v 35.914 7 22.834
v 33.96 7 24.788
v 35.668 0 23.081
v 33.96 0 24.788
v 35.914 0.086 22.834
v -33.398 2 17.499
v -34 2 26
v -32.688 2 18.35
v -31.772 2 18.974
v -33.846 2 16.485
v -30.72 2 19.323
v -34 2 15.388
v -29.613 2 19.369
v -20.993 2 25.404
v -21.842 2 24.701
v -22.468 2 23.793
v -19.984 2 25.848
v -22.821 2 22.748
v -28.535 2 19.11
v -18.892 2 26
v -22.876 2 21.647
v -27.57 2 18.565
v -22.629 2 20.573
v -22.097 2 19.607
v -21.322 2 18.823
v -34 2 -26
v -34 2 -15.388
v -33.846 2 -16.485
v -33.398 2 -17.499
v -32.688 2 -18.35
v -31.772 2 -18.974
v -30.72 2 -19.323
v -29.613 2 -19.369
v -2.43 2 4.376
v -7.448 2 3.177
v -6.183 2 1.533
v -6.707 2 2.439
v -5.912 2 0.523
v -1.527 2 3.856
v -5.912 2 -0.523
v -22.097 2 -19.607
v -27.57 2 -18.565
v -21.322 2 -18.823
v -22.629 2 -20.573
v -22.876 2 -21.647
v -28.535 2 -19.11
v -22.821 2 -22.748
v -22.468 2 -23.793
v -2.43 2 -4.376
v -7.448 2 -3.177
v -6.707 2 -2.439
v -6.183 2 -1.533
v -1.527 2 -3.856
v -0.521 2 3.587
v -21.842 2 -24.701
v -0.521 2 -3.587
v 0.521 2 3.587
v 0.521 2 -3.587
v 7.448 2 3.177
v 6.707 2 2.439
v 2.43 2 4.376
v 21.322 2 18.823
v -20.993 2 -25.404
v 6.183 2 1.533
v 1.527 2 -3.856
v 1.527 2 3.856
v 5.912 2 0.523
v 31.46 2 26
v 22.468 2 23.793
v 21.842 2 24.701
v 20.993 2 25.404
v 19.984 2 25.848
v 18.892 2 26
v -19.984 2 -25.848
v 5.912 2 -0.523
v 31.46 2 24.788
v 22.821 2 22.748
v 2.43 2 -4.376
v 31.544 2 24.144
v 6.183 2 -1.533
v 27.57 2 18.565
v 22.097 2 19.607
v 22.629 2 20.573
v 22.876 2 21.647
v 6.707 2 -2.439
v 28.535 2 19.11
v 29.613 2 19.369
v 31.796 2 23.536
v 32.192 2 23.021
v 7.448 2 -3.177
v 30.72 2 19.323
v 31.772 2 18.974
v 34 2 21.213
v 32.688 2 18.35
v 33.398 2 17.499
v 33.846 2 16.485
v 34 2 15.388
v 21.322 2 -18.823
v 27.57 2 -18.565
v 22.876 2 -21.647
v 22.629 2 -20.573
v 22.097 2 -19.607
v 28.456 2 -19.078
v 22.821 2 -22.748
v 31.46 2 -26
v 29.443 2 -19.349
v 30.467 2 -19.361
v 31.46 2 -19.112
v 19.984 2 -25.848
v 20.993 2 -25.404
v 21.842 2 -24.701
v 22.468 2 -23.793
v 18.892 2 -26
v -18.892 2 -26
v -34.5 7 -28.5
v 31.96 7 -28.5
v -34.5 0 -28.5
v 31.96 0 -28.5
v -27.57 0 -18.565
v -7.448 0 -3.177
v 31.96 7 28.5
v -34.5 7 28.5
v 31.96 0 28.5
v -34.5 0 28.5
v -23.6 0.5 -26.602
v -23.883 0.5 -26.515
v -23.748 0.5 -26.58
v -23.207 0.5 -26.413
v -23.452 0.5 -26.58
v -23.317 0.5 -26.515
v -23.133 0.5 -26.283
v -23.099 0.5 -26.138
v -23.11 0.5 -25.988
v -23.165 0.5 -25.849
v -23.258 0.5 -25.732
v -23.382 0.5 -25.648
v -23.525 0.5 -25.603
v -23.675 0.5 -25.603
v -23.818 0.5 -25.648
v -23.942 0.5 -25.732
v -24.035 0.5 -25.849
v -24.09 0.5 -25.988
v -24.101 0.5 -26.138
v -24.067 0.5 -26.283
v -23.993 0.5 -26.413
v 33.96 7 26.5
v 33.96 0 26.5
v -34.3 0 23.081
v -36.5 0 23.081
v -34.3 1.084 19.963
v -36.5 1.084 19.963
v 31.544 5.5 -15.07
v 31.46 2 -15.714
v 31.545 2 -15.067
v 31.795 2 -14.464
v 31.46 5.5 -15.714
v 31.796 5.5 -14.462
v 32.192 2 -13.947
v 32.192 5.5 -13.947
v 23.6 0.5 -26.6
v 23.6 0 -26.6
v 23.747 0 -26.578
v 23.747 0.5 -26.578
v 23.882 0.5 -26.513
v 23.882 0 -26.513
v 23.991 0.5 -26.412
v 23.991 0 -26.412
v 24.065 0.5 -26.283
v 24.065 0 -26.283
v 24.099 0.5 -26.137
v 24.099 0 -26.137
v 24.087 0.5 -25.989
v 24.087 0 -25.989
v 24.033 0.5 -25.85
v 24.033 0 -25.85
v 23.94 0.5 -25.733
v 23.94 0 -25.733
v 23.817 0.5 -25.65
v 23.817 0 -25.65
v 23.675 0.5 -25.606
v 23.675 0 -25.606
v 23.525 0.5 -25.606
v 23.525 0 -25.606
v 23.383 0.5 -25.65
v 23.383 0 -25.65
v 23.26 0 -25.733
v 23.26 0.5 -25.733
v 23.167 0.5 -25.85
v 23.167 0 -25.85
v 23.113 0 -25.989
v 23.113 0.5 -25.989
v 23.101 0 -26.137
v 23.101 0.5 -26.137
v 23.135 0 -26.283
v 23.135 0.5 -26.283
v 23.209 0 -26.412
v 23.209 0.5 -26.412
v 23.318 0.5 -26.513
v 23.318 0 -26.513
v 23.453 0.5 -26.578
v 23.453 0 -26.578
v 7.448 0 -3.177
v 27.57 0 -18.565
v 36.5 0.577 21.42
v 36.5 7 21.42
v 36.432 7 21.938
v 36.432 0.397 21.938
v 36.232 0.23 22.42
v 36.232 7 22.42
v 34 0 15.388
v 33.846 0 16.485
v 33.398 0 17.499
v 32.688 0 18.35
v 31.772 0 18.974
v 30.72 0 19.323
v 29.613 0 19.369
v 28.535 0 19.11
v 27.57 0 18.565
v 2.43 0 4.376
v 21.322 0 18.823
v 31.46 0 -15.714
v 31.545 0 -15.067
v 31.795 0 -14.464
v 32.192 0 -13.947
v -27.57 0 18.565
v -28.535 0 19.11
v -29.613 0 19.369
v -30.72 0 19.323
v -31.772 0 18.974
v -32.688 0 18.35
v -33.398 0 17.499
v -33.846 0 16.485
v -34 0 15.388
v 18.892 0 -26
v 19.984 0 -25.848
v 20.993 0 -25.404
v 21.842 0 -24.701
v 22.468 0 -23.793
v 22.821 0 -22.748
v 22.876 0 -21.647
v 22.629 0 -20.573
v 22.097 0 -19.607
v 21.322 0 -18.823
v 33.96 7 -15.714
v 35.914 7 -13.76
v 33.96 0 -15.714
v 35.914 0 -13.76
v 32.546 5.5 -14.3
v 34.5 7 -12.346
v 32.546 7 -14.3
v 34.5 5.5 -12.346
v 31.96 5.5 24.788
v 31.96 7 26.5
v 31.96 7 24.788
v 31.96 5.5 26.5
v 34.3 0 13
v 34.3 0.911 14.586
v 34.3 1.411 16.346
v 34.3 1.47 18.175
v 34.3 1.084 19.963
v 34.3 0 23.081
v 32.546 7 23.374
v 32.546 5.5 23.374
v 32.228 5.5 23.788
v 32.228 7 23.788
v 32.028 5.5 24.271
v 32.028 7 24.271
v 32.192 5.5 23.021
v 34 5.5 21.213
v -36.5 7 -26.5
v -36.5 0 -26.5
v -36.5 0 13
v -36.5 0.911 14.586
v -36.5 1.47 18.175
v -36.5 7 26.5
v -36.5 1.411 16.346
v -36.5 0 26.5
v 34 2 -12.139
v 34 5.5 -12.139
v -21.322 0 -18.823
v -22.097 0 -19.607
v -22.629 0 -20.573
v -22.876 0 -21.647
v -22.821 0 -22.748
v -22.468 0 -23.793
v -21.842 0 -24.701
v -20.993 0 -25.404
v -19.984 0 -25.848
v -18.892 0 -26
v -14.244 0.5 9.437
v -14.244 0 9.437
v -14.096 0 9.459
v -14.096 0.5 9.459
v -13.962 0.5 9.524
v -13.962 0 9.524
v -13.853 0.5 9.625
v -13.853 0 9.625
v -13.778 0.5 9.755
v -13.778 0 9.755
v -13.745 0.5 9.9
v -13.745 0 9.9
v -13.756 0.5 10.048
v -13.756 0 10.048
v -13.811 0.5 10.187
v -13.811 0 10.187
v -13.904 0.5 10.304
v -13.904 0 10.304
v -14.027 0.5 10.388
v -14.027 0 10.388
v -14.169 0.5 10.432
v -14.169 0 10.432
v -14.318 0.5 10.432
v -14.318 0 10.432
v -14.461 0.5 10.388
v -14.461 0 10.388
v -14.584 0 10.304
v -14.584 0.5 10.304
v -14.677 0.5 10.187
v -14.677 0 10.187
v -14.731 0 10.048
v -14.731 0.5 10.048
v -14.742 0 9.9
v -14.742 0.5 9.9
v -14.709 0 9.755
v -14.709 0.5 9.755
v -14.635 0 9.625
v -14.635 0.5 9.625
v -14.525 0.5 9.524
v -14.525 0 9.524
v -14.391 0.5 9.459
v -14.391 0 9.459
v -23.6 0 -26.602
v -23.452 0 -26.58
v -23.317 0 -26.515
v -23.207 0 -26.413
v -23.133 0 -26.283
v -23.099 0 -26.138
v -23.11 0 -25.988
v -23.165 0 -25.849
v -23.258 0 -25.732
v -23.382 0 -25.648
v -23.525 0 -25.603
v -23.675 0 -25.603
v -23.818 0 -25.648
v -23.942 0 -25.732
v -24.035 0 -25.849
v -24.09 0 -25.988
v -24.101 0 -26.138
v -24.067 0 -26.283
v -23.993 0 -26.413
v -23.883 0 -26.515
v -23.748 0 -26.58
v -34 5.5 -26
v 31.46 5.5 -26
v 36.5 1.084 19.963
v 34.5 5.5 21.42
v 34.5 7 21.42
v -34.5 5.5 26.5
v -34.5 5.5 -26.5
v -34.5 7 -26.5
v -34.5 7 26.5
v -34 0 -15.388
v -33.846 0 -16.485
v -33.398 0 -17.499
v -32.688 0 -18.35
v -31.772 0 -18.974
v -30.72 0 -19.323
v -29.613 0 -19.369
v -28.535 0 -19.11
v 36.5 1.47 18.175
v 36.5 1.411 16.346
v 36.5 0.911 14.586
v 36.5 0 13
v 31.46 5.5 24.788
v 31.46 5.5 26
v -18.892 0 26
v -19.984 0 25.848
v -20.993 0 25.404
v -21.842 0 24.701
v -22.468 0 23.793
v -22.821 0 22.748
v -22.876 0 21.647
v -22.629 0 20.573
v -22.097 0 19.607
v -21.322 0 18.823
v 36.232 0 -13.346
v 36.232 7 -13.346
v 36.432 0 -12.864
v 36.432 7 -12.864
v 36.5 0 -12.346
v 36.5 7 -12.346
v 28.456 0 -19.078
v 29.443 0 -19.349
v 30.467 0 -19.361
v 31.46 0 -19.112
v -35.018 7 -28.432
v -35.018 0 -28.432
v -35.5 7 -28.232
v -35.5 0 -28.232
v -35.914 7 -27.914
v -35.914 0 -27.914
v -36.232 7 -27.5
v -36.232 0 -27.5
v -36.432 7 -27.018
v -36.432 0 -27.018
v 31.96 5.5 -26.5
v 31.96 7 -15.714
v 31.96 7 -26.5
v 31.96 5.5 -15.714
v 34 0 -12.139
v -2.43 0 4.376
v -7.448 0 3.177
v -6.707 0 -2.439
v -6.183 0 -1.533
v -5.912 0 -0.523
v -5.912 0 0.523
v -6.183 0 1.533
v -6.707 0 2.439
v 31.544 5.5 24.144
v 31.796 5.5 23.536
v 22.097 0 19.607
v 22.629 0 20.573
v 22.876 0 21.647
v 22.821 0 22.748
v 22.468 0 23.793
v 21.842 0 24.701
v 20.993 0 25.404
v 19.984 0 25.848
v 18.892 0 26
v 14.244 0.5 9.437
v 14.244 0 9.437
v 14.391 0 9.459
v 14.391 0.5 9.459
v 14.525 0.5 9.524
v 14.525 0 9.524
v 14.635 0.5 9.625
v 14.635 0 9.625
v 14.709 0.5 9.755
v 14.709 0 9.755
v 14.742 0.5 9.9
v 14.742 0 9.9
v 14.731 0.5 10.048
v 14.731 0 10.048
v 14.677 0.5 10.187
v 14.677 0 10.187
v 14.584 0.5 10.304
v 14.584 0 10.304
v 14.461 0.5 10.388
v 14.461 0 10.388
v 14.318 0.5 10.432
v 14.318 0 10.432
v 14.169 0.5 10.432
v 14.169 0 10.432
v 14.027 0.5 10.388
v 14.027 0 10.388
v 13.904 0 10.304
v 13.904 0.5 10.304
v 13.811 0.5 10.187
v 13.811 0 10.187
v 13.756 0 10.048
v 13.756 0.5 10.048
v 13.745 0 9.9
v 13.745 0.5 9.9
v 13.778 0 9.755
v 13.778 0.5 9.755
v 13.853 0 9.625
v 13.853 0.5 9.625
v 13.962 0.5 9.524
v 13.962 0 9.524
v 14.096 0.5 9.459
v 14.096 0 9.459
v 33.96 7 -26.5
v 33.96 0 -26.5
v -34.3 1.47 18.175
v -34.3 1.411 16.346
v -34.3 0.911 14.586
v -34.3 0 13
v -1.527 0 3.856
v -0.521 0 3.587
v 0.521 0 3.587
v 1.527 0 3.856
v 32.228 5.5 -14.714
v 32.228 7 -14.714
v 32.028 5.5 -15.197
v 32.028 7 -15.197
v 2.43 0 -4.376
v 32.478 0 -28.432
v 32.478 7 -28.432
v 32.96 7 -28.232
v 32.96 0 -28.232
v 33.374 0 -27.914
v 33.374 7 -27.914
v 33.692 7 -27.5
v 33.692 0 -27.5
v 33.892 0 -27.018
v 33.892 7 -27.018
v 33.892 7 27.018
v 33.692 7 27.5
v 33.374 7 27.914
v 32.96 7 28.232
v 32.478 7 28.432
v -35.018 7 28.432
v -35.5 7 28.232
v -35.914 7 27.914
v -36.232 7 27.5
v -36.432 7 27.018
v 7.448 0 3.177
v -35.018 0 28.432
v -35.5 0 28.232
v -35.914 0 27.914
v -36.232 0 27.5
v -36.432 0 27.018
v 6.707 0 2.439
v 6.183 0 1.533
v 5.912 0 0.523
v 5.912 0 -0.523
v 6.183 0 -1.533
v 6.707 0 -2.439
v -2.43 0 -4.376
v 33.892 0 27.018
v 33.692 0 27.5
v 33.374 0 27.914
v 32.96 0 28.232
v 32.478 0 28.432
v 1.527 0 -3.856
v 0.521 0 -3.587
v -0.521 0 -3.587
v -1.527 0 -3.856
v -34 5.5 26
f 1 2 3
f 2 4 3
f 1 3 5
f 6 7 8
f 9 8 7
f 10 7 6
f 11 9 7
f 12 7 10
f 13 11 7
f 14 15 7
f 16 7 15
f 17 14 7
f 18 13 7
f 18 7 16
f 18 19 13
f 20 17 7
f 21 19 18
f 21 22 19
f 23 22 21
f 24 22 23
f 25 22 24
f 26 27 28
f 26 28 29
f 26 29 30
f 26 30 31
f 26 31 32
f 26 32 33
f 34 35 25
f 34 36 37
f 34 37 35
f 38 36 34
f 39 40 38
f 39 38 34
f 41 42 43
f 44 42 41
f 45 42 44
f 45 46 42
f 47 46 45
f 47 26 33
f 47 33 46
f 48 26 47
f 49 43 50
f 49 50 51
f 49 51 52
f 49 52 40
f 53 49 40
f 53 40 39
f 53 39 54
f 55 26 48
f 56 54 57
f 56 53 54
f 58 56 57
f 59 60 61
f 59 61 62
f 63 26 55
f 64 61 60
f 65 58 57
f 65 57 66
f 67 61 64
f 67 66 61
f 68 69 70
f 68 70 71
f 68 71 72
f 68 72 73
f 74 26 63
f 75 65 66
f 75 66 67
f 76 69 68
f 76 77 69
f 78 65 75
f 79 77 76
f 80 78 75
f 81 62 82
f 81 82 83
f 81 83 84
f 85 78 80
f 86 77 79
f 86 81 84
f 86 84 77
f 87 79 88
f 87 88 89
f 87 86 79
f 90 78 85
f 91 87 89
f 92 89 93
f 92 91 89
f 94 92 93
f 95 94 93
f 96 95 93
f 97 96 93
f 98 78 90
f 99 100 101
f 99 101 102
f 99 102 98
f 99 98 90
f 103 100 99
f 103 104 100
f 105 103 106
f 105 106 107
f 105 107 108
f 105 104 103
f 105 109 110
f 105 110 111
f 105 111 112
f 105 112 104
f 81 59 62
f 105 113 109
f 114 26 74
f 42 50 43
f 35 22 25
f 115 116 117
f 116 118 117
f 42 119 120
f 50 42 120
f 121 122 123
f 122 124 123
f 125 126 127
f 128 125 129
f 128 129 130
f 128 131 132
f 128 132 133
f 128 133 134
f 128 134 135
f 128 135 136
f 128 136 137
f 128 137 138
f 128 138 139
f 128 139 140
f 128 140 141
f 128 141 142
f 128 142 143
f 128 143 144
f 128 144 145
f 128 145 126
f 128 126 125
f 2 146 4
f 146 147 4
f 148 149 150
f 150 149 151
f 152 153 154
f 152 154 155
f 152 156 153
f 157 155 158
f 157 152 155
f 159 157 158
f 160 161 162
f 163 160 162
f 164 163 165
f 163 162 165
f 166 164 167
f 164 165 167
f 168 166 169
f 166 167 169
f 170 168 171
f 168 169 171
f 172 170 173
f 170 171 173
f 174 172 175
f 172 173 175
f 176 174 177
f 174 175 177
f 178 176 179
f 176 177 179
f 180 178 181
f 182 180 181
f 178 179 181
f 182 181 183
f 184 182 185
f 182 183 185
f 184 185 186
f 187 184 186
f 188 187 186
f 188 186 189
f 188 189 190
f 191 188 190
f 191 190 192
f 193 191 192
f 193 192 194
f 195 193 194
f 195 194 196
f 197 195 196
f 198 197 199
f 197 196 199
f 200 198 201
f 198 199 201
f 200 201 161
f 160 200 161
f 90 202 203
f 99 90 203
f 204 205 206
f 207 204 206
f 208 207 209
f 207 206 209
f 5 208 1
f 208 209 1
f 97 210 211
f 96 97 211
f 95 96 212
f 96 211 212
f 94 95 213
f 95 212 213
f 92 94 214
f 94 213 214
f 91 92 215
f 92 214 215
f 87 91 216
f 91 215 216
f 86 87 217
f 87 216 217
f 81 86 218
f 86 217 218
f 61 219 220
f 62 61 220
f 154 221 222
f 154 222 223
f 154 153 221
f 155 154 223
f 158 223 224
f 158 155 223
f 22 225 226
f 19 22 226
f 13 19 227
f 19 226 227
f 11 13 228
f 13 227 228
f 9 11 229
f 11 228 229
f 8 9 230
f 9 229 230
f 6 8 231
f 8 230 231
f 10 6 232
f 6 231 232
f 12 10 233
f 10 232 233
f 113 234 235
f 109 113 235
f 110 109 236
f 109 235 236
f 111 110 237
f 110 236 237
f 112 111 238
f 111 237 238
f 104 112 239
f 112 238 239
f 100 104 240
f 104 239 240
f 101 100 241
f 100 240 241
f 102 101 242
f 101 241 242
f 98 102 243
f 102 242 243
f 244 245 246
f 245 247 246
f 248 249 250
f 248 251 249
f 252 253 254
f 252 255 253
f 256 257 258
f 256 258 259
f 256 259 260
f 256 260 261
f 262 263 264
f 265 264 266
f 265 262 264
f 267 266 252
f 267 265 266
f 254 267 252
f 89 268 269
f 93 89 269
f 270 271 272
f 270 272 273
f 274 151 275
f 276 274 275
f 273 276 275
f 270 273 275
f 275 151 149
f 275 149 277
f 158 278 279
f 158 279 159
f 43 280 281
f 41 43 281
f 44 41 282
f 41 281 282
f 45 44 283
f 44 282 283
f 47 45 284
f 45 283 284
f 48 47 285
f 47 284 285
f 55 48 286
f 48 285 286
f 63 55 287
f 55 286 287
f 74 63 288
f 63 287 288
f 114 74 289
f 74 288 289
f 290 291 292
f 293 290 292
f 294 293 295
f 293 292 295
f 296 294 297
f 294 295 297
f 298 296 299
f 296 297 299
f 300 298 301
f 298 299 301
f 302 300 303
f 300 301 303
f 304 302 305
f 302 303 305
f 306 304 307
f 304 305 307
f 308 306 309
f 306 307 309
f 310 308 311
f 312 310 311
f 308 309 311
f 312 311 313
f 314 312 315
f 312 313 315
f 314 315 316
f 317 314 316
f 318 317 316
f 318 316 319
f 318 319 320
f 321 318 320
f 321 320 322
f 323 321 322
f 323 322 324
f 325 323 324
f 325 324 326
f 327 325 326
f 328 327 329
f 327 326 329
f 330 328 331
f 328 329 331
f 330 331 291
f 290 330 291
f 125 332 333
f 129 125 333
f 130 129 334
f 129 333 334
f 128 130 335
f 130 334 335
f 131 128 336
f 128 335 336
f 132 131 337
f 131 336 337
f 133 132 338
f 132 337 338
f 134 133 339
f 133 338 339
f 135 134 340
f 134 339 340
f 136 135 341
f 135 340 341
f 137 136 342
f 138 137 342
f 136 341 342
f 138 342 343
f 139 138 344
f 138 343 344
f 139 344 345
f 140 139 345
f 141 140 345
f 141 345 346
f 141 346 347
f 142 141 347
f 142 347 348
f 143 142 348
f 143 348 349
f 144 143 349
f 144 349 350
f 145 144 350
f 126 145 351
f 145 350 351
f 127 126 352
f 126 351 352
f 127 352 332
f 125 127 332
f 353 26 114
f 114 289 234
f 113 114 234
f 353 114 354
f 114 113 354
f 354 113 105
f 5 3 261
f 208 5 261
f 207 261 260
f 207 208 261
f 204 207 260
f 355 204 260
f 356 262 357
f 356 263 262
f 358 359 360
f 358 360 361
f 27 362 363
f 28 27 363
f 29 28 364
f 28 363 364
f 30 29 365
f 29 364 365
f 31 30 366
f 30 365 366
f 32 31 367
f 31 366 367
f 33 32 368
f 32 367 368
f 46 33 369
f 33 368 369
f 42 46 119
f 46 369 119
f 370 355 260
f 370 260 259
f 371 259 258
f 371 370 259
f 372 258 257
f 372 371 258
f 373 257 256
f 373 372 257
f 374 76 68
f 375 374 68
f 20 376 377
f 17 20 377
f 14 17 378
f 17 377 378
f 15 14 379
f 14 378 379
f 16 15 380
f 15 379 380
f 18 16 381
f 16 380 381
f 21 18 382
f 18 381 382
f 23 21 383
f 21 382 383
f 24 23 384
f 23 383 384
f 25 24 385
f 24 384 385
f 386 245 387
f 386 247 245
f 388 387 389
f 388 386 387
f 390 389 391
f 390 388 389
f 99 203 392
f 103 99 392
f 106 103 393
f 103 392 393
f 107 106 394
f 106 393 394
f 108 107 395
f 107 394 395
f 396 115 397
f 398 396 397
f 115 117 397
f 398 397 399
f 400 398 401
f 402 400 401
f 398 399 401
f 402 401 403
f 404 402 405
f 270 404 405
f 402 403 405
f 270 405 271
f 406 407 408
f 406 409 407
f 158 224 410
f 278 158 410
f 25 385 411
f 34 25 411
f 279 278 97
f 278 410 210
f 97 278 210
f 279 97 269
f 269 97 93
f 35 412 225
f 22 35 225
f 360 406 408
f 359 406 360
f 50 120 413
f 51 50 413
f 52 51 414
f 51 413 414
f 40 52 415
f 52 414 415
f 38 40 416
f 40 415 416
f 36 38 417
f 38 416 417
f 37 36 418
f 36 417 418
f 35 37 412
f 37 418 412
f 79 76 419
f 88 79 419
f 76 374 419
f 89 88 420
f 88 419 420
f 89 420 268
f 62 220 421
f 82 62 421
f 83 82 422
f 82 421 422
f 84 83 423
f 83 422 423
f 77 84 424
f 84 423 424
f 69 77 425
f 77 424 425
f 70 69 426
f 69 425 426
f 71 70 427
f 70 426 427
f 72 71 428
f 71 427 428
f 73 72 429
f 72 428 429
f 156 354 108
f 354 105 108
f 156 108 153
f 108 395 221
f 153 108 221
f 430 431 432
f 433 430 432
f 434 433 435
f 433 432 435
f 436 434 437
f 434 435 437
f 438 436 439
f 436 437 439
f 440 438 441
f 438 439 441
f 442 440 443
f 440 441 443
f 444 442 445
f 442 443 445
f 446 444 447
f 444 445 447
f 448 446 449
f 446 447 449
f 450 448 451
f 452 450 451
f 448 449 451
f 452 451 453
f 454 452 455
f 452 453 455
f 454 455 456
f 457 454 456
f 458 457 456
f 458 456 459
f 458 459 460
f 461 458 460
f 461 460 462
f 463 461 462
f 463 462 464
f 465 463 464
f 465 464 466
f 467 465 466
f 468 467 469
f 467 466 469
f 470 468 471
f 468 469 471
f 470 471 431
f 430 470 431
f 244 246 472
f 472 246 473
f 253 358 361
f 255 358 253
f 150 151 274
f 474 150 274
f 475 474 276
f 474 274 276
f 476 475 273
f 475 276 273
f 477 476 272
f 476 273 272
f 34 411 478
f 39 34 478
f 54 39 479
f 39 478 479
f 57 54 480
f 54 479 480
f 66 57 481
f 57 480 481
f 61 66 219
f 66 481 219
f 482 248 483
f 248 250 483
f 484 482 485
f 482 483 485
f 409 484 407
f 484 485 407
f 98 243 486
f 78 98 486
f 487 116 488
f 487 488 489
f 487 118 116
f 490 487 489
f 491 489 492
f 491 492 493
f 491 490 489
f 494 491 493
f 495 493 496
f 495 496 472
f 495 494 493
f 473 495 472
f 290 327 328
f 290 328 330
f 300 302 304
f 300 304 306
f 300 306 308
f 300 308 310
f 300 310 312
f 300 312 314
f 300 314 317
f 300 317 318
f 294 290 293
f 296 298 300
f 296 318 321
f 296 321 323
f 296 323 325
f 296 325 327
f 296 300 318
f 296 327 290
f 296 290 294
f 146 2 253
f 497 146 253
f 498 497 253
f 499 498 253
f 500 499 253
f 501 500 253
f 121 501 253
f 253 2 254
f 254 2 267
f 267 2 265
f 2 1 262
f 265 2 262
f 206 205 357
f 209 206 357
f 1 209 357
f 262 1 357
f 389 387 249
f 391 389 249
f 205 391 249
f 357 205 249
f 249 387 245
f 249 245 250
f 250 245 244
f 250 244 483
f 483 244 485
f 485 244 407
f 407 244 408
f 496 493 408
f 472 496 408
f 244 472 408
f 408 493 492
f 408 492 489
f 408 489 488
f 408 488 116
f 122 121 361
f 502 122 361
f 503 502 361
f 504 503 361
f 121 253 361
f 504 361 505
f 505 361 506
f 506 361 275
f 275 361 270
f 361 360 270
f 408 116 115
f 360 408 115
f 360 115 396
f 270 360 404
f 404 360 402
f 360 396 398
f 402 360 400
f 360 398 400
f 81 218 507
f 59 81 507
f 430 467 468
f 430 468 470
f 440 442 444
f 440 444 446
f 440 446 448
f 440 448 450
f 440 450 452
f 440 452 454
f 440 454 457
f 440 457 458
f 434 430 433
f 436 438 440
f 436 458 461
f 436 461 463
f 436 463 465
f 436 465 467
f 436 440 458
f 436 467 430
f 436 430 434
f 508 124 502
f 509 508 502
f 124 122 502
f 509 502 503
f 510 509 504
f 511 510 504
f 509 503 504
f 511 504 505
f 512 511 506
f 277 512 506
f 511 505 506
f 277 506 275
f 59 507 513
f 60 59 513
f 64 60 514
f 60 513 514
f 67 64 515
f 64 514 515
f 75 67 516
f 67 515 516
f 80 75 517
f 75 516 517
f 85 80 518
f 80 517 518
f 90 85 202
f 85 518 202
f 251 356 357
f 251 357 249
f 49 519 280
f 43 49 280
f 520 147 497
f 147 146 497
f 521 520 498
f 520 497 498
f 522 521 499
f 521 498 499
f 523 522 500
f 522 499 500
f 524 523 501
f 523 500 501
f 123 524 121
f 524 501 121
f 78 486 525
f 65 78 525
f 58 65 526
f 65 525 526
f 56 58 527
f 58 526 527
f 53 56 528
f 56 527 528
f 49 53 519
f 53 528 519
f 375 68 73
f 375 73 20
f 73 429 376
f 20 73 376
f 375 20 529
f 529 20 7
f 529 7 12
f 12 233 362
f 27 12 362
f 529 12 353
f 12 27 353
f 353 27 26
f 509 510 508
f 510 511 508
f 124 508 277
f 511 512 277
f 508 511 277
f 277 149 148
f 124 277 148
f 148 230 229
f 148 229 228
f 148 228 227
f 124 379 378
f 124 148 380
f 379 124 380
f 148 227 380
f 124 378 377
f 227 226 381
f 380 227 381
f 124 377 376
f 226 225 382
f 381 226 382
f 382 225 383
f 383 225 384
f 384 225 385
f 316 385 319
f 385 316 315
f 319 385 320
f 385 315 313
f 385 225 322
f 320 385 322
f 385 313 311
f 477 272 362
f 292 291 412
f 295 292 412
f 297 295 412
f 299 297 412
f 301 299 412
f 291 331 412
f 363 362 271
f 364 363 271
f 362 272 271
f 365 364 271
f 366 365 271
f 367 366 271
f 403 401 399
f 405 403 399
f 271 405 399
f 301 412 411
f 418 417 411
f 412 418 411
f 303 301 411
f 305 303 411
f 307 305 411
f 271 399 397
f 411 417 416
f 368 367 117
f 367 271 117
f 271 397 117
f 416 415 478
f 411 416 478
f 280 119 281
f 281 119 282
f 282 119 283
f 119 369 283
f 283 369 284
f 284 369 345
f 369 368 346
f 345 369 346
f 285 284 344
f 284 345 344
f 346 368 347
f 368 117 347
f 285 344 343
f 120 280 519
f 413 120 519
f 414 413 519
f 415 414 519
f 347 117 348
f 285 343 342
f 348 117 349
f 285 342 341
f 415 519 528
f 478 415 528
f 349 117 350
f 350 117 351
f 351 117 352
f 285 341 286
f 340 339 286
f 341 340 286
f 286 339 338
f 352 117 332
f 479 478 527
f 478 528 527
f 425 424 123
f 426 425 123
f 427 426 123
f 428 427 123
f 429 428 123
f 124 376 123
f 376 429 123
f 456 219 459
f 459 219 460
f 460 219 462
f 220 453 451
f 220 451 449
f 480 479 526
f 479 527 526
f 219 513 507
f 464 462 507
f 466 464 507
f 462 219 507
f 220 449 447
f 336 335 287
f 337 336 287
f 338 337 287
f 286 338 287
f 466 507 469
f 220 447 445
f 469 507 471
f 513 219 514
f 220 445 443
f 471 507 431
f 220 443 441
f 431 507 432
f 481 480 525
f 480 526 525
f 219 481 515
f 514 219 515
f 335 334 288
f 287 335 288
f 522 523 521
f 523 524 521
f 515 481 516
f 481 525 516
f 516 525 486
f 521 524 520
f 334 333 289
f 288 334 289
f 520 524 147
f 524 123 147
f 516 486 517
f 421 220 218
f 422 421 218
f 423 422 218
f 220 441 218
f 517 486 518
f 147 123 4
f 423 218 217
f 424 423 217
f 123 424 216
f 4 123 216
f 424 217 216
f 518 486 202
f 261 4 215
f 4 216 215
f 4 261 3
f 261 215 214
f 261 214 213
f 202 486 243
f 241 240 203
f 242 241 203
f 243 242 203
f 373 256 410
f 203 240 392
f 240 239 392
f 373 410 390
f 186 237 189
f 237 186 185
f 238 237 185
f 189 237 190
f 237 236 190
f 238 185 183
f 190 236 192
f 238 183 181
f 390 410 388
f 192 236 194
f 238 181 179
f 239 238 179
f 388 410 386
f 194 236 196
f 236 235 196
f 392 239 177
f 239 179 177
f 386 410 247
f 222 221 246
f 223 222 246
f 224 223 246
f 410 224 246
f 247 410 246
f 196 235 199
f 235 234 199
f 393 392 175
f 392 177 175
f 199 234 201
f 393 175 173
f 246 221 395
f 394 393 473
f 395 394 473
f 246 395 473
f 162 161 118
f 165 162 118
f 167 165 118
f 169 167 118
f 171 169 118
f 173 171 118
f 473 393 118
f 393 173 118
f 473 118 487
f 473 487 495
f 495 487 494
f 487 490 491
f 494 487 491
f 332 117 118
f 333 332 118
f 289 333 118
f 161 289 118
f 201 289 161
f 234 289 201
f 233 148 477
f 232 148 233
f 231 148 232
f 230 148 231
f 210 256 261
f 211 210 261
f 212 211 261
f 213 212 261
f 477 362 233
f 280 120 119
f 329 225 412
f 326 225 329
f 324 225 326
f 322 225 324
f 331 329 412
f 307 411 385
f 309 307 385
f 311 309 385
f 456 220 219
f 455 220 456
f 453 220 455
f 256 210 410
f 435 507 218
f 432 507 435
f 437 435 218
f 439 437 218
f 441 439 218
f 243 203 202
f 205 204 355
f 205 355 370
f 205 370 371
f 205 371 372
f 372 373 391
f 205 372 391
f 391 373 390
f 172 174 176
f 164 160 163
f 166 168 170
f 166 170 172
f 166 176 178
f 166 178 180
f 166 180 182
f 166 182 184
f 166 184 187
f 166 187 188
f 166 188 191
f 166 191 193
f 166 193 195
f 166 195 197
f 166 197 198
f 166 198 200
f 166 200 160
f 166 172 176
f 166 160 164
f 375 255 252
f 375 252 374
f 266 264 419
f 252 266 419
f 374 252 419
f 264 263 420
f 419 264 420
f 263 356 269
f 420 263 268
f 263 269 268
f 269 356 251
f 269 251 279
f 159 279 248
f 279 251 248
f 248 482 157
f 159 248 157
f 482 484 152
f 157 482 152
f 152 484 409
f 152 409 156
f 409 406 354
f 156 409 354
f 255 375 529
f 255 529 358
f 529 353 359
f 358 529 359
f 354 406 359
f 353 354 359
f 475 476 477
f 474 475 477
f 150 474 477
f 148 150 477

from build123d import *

# Parameters (mm, degrees)
EXTRUDE_1_DEPTH     = 2
EXTRUDE_2_DEPTH     = 7
EXTRUDE_3_DEPTH     = 5.5
FILLET_1_R          = 2
FILLET_2_R          = 2.5
CUT_EXTRUDE_1_DEPTH = 2.2
SKETCH_7_R          = 0.5
SKETCH_7_R_2        = 0.502126781
CUT_EXTRUDE_2_DEPTH = 0.5


with BuildPart() as part:
    # Эскиз1 → Бобышка-Вытянуть1 (new body)
    with BuildSketch(Plane(origin=(0, 0, 0), x_dir=(1, 0, 0), z_dir=(0, 1, 0))):
        Polygon((-36.5, 28.5), (-36.5, -28.5), (33.96, -28.5), (33.96, -24.788427125), (36.5, -22.248427125), (36.5, 13.174427125), (33.96, 15.714427125), (33.96, 28.5), align=None)
        with BuildLine():
            Line((18.891876357, -26), (-18.891876357, -26))
            ThreePointArc((-18.891876357, -26), (-22.680657515, -23.282629072), (-21.321676788, -18.822568668))
            Line((-21.321676788, -18.822568668), (-2.42980043, -4.375839689))
            ThreePointArc((-2.42980043, -4.375839689), (0, -3.553271021), (2.42980043, -4.375839689))
            Line((2.42980043, -4.375839689), (21.321676788, -18.822568668))
            ThreePointArc((21.321676788, -18.822568668), (22.680657515, -23.282629072), (18.891876357, -26))
        make_face(mode=Mode.SUBTRACT)
        with BuildLine():
            Line((34, 12.138893219), (34, -15.38790545))
            ThreePointArc((34, -15.38790545), (31.772117135, -18.973934014), (27.57019957, -18.565336782))
            Line((27.57019957, -18.565336782), (7.447553982, -3.177431332))
            ThreePointArc((7.447553982, -3.177431332), (5.877354412, 0), (7.447553982, 3.177431332))
            Line((7.447553982, 3.177431332), (27.57019957, 18.565336782))
            ThreePointArc((27.57019957, 18.565336782), (29.443384545, 19.348988538), (31.46, 19.111935525))
            Line((31.46, 19.111935525), (31.46, 14.678893219))
            Line((31.46, 14.678893219), (34, 12.138893219))
        make_face(mode=Mode.SUBTRACT)
        with BuildLine():
            Line((-18.891876357, 26), (18.891876357, 26))
            ThreePointArc((18.891876357, 26), (22.680657515, 23.282629072), (21.321676788, 18.822568668))
            Line((21.321676788, 18.822568668), (2.42980043, 4.375839689))
            ThreePointArc((2.42980043, 4.375839689), (0, 3.553271021), (-2.42980043, 4.375839689))
            Line((-2.42980043, 4.375839689), (-21.321676788, 18.822568668))
            ThreePointArc((-21.321676788, 18.822568668), (-22.680657515, 23.282629072), (-18.891876357, 26))
        make_face(mode=Mode.SUBTRACT)
        with BuildLine():
            Line((-34, -15.38790545), (-34, 15.38790545))
            ThreePointArc((-34, 15.38790545), (-31.772117135, 18.973934014), (-27.57019957, 18.565336782))
            Line((-27.57019957, 18.565336782), (-7.447553982, 3.177431332))
            ThreePointArc((-7.447553982, 3.177431332), (-5.877354412, 0), (-7.447553982, -3.177431332))
            Line((-7.447553982, -3.177431332), (-27.57019957, -18.565336782))
            ThreePointArc((-27.57019957, -18.565336782), (-31.772117135, -18.973934014), (-34, -15.38790545))
        make_face(mode=Mode.SUBTRACT)
    extrude(amount=EXTRUDE_1_DEPTH)

    # Эскиз5 → Бобышка-Вытянуть2 (add)
    with BuildSketch(Plane(origin=(0, 0, 0), x_dir=(1, 0, 0), z_dir=(0, 1, 0))):
        Polygon((33.96, -26.5), (33.96, -28.5), (-36.5, -28.5), (-36.5, 28.5), (31.96, 28.5), (33.96, 28.5), (33.96, 15.714427125), (36.5, 13.174427125), (36.5, -22.248427125), (33.96, -24.788427125), align=None)
        Polygon((31.96, -23.96), (34.5, -21.42), (34.5, 12.346), (31.96, 14.886), (31.96, 26.5), (-34.5, 26.5), (-34.5, -26.5), (31.96, -26.5), align=None, mode=Mode.SUBTRACT)
    extrude(amount=EXTRUDE_2_DEPTH)

    # Эскиз6 → Бобышка-Вытянуть3 (add)
    with BuildSketch(Plane(origin=(0, 0, 0), x_dir=(1, 0, 0), z_dir=(0, 1, 0))):
        Polygon((31.96, -23.96), (31.96, -26.5), (-34.5, -26.5), (-34.5, 26.5), (31.96, 26.5), (31.96, 14.886), (34.5, 12.346), (34.5, -21.42), align=None)
        Polygon((31.46, 26), (-34, 26), (-34, -26), (31.46, -26), (31.46, -23.96), (31.46, -23.752893219), (31.606446609, -23.606446609), (34, -21.212893219), (34, 12.138893219), (31.606446609, 14.532446609), (31.46, 14.678893219), (31.46, 14.886), align=None, mode=Mode.SUBTRACT)
    extrude(amount=EXTRUDE_3_DEPTH)

    # Скругление1
    fillet_1_edges = [part.edges().sort_by_distance(p)[0] for p in [
        (31.96, 6.25, 23.96),
        (31.96, 6.25, -14.886),
        (33.96, 3.5, 28.5),
        (-36.5, 3.5, 28.5),
        (-36.5, 3.5, -28.5),
        (33.96, 3.5, -28.5),
        (36.5, 3.5, -13.174427125),
        (36.5, 3.5, 22.248427125),
    ]]
    fillet(fillet_1_edges, radius=FILLET_1_R)

    # Скругление2
    fillet_2_edges = [part.edges().sort_by_distance(p)[0] for p in [
        (31.46, 3.75, 23.752893219),
        (31.46, 2.75, -14.678893219),
    ]]
    fillet(fillet_2_edges, radius=FILLET_2_R)

    # Эскиз4 → Вырез-Вытянуть1 (cut)
    with BuildSketch(Plane(origin=(36.5, 0, 0), x_dir=(0, 0, -1), z_dir=(1, 0, 0))):
        with BuildLine():
            Line((-23.080914643, 0), (-19.962989622, 1.084044193))
            ThreePointArc((-19.962989622, 1.084044193), (-16.346249259, 1.410725958), (-13, 0))
            Line((-13, 0), (-23.080914643, 0))
        make_face()
    cut_extrude_1 = extrude(amount=-CUT_EXTRUDE_1_DEPTH, mode=Mode.SUBTRACT)

    # Зеркальное отражение1: Вырез-Вытянуть1 across plane
    add(cut_extrude_1.mirror(Plane(origin=(0, 0, 0), x_dir=(0, 0, 1), z_dir=(1, 0, 0))), mode=Mode.SUBTRACT)

    # Эскиз7 → Вырез-Вытянуть2 (cut)
    with BuildSketch(Plane.XZ):
        with Locations(Location((14.24363767, 9.937218253, 0), (0, 0, 270))):
            Circle(SKETCH_7_R)
        with Locations(Location((23.6, -26.1, 0), (0, 0, 270))):
            Circle(SKETCH_7_R)
        with Locations(Location((-14.24363767, 9.937218253, 0), (0, 0, 270))):
            Circle(SKETCH_7_R)
        with Locations(Location((-23.6, -26.1, 0), (0, 0, 270))):
            Circle(SKETCH_7_R_2)
    extrude(amount=-CUT_EXTRUDE_2_DEPTH, mode=Mode.SUBTRACT)


solid = part.part
